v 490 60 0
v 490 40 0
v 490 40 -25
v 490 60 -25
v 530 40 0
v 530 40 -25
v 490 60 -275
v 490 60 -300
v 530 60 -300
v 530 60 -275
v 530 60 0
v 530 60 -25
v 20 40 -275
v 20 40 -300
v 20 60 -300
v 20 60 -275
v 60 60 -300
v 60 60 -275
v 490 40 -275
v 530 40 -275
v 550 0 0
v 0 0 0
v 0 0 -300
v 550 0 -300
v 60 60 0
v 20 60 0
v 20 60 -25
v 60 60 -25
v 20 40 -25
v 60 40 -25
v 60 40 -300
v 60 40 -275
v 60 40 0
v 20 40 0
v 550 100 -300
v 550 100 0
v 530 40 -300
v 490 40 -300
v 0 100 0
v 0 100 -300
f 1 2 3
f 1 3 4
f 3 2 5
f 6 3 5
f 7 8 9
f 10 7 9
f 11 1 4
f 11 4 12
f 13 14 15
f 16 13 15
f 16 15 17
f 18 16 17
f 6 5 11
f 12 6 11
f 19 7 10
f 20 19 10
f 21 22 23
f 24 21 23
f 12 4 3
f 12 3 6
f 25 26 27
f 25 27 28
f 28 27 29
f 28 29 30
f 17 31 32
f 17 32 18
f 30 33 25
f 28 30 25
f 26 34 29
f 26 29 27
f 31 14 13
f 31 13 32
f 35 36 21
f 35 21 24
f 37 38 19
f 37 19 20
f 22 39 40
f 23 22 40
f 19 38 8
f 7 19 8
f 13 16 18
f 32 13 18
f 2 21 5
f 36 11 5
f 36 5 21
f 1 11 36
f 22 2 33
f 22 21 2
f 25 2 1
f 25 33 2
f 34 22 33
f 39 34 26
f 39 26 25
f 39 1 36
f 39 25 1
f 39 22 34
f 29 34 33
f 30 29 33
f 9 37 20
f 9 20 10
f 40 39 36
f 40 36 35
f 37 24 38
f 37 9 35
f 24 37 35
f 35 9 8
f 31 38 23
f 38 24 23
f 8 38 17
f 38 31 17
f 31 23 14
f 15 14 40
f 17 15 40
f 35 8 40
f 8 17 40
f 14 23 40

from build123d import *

# Parameters (mm, degrees)
SKETCH1_W           = 300
SKETCH1_H           = 100
BOSS_EXTRUDE1_DEPTH = 550
SKETCH2_W           = 40
SKETCH2_H           = 20
CUT_EXTRUDE1_DEPTH  = 25


with BuildPart() as part:
    # Sketch1 → Boss-Extrude1 (new body)
    with BuildSketch(Plane(origin=(0, 0, 0), x_dir=(0, 0, -1), z_dir=(1, 0, 0))):
        with Locations((150, 50)):
            Rectangle(SKETCH1_W, SKETCH1_H)
    extrude(amount=BOSS_EXTRUDE1_DEPTH)

    # Sketch2 → Cut-Extrude1 (cut)
    with BuildSketch(Plane.XY):
        with Locations((40, 50)):
            Rectangle(SKETCH2_W, SKETCH2_H)
        with Locations((510, 50)):
            Rectangle(SKETCH2_W, SKETCH2_H)
    cut_extrude1 = extrude(amount=-CUT_EXTRUDE1_DEPTH, mode=Mode.SUBTRACT)

    # Mirror1: Cut-Extrude1 across plane
    add(cut_extrude1.mirror(Plane.XY.offset(-150)), mode=Mode.SUBTRACT)


solid = part.part
